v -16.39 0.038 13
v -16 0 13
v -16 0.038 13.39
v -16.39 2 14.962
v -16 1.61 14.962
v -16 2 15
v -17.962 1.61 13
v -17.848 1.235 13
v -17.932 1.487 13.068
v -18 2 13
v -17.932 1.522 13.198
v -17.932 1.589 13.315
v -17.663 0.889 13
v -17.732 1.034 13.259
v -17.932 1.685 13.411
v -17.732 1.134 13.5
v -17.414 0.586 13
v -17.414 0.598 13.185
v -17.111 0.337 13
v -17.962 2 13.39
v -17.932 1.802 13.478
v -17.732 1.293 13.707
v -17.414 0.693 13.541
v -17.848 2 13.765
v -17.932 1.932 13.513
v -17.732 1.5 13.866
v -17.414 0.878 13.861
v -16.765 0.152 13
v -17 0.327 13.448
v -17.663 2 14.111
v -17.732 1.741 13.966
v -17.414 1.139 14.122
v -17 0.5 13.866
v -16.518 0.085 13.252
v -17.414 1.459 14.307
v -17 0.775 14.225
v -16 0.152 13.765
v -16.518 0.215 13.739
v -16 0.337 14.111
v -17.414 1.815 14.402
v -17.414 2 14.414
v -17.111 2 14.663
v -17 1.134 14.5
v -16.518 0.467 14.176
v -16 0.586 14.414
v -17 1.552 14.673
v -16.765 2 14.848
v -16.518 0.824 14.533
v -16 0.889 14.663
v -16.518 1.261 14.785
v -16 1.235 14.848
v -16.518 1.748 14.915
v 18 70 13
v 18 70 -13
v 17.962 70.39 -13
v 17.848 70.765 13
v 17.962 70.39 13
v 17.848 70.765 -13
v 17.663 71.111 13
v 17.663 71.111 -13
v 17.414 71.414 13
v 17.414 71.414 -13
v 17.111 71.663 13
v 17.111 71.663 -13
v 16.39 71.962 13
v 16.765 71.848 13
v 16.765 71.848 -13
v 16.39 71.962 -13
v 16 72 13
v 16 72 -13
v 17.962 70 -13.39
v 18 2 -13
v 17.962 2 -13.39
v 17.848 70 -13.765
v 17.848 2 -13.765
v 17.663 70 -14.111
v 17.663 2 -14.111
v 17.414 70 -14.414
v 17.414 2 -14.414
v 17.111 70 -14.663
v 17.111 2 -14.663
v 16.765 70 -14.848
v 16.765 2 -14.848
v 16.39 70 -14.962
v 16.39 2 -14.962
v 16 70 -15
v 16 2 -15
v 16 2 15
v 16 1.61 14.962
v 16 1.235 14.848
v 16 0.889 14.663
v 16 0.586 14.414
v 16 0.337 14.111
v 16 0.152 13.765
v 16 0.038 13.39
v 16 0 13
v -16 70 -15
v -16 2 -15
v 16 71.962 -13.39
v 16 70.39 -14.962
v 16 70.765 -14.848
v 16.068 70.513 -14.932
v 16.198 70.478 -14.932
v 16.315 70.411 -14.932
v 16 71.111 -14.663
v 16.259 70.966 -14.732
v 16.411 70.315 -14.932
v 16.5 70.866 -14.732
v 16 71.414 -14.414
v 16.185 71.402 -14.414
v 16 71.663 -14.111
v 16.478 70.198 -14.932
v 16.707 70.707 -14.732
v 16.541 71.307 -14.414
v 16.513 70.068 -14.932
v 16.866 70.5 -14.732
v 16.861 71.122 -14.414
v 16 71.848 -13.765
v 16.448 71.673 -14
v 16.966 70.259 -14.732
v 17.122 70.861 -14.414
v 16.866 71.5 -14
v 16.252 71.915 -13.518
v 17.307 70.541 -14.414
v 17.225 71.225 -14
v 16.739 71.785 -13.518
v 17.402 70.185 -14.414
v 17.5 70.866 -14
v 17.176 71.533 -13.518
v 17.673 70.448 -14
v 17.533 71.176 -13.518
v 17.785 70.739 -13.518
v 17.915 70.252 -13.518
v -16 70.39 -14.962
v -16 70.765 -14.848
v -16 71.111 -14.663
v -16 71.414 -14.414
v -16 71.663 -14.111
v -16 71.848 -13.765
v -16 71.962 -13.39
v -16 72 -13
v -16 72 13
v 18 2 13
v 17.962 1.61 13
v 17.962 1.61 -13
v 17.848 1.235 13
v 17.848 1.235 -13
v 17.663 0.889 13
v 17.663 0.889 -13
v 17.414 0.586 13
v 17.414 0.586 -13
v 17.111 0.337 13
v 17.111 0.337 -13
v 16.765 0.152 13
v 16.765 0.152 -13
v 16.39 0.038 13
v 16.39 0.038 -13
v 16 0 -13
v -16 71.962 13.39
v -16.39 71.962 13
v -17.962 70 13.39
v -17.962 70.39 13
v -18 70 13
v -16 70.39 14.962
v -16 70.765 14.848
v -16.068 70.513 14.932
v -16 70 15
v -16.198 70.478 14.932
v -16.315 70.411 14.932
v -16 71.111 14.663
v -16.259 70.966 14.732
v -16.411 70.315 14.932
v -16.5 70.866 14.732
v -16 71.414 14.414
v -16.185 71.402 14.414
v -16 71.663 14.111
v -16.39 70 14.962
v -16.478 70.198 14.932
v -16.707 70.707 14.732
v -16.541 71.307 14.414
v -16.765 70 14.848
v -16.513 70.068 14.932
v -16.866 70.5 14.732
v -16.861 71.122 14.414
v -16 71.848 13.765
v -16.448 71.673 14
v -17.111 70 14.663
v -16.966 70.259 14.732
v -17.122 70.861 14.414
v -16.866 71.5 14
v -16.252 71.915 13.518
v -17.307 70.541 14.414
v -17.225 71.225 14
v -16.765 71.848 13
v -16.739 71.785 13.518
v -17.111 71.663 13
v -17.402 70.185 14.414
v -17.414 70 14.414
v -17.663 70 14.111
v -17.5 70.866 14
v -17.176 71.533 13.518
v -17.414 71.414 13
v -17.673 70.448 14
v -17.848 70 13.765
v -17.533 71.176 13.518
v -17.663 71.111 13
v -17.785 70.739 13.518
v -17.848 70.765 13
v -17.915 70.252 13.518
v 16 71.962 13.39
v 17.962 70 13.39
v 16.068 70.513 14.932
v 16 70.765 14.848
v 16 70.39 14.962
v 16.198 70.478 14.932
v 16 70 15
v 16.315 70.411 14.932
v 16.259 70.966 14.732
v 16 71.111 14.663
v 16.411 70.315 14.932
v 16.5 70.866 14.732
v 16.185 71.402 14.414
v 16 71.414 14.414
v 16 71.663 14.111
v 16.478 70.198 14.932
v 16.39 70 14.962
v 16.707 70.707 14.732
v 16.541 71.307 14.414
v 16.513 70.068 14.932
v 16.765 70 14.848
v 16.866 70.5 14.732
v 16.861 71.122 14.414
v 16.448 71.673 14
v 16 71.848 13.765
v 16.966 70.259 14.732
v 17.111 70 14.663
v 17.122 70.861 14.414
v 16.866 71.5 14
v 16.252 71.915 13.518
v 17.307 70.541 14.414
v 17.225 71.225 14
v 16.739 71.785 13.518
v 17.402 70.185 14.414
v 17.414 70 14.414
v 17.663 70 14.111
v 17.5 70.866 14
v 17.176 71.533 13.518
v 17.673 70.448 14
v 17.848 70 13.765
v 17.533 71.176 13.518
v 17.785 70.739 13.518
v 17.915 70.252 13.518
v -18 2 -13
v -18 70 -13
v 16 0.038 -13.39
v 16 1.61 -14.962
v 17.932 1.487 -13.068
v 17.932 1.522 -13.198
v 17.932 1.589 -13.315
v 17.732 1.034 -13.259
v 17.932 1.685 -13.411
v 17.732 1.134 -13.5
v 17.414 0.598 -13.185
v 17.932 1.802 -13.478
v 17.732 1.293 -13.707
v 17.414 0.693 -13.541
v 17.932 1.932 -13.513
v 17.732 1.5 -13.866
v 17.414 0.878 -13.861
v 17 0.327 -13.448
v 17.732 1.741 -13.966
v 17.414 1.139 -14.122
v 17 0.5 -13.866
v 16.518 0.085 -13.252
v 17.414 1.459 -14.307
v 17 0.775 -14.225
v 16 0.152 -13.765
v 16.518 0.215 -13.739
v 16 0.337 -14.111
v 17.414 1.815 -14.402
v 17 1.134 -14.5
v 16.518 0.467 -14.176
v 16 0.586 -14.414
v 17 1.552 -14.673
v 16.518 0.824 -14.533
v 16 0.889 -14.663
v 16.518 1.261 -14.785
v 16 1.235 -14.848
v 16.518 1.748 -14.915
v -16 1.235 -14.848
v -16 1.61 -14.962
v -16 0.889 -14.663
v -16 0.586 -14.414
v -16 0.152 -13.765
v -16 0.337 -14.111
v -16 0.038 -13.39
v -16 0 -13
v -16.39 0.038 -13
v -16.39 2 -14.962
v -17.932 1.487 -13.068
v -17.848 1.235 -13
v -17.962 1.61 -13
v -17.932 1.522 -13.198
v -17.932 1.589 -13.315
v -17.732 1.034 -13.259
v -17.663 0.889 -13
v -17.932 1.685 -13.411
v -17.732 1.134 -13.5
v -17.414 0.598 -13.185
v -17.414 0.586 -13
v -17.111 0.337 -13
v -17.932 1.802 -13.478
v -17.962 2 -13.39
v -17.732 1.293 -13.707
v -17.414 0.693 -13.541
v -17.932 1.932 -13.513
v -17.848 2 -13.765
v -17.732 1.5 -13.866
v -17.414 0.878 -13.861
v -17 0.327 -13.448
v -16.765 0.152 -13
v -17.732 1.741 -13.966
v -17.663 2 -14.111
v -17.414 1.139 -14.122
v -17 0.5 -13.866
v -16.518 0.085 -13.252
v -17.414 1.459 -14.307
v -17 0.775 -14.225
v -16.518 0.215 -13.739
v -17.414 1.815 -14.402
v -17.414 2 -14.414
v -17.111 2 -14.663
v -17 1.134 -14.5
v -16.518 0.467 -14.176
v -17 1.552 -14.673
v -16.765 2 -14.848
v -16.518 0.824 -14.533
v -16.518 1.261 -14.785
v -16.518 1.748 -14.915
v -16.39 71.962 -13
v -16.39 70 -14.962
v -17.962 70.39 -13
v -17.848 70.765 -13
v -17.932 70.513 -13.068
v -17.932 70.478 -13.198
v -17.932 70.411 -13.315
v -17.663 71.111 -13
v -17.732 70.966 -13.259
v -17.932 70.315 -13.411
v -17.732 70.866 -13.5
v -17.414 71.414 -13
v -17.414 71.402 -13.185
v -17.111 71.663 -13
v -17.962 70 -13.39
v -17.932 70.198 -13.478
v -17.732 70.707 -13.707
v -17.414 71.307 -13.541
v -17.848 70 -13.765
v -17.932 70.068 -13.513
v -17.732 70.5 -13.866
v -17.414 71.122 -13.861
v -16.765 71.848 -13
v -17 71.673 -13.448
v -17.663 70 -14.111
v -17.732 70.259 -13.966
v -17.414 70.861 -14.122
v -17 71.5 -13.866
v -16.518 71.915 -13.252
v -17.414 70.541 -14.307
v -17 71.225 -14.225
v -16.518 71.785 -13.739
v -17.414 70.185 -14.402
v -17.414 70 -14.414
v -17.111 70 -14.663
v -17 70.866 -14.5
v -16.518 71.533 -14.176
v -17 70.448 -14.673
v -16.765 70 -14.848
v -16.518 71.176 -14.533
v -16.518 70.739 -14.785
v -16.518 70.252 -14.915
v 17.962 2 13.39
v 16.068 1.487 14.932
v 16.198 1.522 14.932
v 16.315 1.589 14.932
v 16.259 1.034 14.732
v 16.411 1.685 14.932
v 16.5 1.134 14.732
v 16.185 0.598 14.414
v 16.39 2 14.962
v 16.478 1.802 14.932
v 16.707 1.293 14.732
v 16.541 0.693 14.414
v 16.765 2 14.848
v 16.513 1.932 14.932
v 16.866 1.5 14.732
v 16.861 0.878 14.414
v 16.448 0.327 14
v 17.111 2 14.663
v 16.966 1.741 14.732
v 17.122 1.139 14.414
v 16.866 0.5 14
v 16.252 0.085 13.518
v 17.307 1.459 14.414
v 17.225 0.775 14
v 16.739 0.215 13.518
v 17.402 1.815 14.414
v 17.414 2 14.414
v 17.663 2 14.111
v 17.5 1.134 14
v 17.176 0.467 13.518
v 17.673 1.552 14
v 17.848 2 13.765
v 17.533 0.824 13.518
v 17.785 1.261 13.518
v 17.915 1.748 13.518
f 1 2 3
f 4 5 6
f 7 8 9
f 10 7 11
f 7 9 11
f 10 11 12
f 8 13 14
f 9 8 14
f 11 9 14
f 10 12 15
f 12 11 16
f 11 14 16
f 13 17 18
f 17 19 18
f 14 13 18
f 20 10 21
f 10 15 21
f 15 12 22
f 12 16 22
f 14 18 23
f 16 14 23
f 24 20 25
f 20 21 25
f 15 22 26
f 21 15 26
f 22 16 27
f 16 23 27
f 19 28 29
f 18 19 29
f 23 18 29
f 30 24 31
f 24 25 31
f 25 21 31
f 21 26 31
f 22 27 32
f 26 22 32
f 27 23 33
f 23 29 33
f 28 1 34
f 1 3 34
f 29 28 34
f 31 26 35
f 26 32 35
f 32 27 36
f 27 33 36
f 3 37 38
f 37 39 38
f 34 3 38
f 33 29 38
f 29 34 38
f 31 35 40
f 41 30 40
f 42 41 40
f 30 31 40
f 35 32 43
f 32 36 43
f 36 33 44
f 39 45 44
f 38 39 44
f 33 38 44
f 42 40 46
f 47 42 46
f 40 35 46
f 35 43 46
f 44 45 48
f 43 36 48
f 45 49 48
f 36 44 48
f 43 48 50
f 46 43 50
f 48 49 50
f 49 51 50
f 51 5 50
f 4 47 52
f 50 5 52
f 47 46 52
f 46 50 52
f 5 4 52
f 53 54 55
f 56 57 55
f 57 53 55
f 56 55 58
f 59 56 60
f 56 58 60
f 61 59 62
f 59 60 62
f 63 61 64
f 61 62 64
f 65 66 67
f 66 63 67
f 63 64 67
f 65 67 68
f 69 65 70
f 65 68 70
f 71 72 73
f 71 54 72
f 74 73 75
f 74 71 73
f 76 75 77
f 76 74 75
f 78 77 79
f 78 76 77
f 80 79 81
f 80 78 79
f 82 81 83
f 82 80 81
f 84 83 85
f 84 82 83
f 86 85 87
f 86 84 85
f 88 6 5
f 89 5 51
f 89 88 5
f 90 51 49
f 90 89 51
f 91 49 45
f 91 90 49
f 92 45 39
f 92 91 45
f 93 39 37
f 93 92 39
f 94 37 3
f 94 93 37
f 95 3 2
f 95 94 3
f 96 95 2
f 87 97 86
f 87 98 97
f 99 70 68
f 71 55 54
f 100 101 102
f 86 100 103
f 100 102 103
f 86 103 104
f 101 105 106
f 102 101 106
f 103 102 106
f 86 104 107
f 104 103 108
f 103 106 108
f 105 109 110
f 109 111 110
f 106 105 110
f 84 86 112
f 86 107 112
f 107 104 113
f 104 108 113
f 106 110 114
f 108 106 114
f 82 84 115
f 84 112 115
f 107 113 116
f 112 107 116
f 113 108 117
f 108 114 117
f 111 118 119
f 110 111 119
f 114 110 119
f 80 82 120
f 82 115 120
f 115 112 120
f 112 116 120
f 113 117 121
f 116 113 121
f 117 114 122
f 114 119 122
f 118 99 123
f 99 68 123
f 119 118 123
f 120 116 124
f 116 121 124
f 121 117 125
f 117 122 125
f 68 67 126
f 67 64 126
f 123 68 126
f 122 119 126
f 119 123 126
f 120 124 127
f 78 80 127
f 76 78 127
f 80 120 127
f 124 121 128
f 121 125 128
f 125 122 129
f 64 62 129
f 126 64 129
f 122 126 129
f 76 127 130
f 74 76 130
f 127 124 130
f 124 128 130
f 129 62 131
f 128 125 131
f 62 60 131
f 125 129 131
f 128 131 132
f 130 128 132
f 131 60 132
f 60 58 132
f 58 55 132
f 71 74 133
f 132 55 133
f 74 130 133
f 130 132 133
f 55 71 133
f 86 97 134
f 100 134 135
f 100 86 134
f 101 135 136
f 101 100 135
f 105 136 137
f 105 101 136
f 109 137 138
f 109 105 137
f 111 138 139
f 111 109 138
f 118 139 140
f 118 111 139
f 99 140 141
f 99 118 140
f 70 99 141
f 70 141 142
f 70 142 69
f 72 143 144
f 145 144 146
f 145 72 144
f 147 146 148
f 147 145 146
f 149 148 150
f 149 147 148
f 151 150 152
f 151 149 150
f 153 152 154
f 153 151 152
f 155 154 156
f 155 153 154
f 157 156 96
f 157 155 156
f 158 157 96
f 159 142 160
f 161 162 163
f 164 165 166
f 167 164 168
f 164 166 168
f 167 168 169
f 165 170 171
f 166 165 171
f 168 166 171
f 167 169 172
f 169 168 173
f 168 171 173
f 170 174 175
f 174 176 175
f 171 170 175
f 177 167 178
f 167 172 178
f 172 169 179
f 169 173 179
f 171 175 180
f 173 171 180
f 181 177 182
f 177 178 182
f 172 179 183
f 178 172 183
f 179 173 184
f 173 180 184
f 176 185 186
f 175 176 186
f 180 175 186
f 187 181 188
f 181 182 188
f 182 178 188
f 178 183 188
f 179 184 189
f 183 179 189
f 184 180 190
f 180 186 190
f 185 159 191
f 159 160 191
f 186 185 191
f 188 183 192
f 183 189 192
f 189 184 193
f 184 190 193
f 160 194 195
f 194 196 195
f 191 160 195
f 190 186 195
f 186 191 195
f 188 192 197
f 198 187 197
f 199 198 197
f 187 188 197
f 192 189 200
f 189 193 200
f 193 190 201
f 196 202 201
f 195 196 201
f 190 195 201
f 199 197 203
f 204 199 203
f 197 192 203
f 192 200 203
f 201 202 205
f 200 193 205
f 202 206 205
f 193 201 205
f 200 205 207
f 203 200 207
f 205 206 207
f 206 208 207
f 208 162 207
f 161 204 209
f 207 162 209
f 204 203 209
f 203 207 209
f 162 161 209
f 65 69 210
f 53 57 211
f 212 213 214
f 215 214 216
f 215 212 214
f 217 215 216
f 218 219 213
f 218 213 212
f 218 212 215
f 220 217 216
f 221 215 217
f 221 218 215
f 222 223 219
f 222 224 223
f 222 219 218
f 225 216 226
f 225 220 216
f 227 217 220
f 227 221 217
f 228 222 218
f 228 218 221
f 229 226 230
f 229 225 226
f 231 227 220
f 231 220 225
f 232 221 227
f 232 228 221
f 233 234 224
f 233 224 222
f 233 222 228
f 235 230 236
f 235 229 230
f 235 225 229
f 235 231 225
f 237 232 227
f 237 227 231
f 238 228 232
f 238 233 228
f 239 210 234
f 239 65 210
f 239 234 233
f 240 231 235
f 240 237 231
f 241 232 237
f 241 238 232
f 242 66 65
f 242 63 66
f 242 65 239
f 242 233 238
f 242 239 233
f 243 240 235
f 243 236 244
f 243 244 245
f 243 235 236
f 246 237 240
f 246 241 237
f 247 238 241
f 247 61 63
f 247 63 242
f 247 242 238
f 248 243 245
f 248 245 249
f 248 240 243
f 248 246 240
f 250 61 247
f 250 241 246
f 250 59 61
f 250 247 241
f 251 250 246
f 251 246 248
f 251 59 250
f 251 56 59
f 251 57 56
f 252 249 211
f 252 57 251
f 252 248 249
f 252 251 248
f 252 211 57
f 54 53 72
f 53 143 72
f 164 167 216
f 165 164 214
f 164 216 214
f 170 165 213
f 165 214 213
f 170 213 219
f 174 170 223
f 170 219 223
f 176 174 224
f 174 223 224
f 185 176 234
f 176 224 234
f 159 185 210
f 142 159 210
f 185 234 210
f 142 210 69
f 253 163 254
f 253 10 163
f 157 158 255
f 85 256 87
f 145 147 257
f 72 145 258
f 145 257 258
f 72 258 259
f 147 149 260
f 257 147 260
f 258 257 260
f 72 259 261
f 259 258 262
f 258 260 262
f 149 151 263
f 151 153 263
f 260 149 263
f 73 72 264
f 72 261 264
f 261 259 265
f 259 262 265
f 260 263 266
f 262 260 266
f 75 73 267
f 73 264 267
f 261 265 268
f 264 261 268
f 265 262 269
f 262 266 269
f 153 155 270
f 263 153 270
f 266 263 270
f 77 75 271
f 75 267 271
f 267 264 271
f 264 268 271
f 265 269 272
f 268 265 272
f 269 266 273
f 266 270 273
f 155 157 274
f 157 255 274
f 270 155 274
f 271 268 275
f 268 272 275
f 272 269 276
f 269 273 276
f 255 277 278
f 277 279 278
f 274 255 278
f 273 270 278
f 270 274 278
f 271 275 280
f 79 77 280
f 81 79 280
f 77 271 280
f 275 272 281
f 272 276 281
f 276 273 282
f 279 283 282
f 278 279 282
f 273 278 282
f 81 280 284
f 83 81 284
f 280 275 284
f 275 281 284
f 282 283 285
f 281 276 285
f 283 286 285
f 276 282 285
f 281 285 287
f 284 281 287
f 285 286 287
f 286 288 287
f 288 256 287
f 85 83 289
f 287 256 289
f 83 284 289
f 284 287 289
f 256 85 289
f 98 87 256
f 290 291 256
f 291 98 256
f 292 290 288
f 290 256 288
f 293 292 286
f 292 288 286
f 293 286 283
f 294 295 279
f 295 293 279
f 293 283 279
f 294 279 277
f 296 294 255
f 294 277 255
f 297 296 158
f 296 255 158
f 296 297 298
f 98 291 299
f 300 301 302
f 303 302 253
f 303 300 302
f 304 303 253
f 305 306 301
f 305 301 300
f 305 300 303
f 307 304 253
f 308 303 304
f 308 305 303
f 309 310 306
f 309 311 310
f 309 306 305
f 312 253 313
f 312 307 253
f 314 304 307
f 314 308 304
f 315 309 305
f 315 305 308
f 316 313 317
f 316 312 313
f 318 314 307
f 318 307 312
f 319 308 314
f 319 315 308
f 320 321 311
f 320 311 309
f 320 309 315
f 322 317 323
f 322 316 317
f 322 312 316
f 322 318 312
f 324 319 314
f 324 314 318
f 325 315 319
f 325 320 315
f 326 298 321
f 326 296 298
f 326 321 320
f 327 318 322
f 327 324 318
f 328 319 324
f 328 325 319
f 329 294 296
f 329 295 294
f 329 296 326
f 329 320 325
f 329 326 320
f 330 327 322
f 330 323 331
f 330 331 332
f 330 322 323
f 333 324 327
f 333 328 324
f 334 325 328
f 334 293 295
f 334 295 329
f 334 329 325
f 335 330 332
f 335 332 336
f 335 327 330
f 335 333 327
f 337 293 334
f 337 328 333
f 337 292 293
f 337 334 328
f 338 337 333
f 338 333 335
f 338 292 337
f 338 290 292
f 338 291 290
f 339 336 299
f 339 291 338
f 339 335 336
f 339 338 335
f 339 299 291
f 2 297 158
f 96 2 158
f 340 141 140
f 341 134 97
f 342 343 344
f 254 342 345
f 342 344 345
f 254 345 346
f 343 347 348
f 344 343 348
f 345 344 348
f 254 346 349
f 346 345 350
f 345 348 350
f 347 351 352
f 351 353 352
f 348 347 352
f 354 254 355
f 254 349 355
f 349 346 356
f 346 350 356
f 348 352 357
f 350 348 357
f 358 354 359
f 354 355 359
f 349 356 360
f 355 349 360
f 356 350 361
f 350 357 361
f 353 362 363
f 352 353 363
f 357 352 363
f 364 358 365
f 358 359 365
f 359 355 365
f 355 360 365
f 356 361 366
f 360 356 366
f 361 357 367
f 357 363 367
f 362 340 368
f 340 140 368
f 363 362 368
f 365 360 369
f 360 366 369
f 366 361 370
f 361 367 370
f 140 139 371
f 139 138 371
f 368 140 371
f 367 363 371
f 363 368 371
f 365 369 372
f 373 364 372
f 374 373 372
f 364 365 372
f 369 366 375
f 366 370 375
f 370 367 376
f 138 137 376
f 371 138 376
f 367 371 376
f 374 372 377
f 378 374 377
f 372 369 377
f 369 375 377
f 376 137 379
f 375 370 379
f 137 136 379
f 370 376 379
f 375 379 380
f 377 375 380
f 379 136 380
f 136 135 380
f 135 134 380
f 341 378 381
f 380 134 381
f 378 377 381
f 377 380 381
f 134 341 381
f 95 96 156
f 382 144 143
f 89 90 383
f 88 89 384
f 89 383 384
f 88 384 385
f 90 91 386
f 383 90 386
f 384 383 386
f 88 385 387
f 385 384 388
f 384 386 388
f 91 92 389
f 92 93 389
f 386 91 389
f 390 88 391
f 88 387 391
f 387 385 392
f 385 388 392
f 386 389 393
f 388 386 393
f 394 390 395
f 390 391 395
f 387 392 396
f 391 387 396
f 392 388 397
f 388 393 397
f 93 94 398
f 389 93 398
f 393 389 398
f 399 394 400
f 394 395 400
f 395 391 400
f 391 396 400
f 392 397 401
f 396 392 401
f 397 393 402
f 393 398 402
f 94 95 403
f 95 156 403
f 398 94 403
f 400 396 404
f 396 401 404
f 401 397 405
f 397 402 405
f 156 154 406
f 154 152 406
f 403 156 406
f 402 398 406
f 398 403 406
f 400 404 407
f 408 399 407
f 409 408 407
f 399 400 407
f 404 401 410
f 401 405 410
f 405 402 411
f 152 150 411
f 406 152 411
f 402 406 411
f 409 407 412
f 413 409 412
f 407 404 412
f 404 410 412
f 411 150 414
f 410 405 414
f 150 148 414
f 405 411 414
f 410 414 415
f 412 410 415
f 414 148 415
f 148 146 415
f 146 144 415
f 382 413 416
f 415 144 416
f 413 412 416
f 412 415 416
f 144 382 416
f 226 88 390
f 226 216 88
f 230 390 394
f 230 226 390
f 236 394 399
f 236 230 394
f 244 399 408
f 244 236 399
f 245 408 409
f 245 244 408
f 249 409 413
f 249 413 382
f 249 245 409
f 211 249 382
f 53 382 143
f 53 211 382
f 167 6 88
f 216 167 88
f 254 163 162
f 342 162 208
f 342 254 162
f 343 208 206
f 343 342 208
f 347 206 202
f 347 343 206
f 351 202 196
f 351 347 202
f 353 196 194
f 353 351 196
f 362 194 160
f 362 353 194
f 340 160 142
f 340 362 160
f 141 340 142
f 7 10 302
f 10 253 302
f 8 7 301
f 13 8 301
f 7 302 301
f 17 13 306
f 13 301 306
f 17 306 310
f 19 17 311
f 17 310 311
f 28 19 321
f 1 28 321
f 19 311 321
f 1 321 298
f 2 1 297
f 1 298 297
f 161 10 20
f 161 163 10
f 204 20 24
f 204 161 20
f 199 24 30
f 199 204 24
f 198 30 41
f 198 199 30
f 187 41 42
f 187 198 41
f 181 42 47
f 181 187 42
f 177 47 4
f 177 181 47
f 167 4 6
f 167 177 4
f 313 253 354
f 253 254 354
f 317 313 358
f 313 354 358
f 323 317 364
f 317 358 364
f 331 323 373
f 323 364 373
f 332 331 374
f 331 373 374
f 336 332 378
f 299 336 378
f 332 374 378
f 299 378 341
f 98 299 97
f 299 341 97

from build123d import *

# Parameters (mm, degrees)
CROQUIS1_W              = 36
CROQUIS1_H              = 30
SALIENTE_EXTRUIR1_DEPTH = 72
REDONDEO1_R             = 2


with BuildPart() as part:
    # Croquis1 → Saliente-Extruir1 (new body)
    with BuildSketch(Plane(origin=(0, 0, 0), x_dir=(1, 0, 0), z_dir=(0, 1, 0))):
        Rectangle(CROQUIS1_W, CROQUIS1_H)
    extrude(amount=SALIENTE_EXTRUIR1_DEPTH)

    # Redondeo1
    redondeo1_edges = [part.edges().sort_by_distance(p)[0] for p in [
        (18, 72, 0),
        (0, 72, -15),
        (-18, 72, 0),
        (0, 0, -15),
        (18, 0, 0),
        (0, 0, 15),
        (-18, 0, 0),
        (0, 72, 15),
        (-18, 36, -15),
        (18, 36, -15),
        (18, 36, 15),
        (-18, 36, 15),
    ]]
    fillet(redondeo1_edges, radius=REDONDEO1_R)


solid = part.part
